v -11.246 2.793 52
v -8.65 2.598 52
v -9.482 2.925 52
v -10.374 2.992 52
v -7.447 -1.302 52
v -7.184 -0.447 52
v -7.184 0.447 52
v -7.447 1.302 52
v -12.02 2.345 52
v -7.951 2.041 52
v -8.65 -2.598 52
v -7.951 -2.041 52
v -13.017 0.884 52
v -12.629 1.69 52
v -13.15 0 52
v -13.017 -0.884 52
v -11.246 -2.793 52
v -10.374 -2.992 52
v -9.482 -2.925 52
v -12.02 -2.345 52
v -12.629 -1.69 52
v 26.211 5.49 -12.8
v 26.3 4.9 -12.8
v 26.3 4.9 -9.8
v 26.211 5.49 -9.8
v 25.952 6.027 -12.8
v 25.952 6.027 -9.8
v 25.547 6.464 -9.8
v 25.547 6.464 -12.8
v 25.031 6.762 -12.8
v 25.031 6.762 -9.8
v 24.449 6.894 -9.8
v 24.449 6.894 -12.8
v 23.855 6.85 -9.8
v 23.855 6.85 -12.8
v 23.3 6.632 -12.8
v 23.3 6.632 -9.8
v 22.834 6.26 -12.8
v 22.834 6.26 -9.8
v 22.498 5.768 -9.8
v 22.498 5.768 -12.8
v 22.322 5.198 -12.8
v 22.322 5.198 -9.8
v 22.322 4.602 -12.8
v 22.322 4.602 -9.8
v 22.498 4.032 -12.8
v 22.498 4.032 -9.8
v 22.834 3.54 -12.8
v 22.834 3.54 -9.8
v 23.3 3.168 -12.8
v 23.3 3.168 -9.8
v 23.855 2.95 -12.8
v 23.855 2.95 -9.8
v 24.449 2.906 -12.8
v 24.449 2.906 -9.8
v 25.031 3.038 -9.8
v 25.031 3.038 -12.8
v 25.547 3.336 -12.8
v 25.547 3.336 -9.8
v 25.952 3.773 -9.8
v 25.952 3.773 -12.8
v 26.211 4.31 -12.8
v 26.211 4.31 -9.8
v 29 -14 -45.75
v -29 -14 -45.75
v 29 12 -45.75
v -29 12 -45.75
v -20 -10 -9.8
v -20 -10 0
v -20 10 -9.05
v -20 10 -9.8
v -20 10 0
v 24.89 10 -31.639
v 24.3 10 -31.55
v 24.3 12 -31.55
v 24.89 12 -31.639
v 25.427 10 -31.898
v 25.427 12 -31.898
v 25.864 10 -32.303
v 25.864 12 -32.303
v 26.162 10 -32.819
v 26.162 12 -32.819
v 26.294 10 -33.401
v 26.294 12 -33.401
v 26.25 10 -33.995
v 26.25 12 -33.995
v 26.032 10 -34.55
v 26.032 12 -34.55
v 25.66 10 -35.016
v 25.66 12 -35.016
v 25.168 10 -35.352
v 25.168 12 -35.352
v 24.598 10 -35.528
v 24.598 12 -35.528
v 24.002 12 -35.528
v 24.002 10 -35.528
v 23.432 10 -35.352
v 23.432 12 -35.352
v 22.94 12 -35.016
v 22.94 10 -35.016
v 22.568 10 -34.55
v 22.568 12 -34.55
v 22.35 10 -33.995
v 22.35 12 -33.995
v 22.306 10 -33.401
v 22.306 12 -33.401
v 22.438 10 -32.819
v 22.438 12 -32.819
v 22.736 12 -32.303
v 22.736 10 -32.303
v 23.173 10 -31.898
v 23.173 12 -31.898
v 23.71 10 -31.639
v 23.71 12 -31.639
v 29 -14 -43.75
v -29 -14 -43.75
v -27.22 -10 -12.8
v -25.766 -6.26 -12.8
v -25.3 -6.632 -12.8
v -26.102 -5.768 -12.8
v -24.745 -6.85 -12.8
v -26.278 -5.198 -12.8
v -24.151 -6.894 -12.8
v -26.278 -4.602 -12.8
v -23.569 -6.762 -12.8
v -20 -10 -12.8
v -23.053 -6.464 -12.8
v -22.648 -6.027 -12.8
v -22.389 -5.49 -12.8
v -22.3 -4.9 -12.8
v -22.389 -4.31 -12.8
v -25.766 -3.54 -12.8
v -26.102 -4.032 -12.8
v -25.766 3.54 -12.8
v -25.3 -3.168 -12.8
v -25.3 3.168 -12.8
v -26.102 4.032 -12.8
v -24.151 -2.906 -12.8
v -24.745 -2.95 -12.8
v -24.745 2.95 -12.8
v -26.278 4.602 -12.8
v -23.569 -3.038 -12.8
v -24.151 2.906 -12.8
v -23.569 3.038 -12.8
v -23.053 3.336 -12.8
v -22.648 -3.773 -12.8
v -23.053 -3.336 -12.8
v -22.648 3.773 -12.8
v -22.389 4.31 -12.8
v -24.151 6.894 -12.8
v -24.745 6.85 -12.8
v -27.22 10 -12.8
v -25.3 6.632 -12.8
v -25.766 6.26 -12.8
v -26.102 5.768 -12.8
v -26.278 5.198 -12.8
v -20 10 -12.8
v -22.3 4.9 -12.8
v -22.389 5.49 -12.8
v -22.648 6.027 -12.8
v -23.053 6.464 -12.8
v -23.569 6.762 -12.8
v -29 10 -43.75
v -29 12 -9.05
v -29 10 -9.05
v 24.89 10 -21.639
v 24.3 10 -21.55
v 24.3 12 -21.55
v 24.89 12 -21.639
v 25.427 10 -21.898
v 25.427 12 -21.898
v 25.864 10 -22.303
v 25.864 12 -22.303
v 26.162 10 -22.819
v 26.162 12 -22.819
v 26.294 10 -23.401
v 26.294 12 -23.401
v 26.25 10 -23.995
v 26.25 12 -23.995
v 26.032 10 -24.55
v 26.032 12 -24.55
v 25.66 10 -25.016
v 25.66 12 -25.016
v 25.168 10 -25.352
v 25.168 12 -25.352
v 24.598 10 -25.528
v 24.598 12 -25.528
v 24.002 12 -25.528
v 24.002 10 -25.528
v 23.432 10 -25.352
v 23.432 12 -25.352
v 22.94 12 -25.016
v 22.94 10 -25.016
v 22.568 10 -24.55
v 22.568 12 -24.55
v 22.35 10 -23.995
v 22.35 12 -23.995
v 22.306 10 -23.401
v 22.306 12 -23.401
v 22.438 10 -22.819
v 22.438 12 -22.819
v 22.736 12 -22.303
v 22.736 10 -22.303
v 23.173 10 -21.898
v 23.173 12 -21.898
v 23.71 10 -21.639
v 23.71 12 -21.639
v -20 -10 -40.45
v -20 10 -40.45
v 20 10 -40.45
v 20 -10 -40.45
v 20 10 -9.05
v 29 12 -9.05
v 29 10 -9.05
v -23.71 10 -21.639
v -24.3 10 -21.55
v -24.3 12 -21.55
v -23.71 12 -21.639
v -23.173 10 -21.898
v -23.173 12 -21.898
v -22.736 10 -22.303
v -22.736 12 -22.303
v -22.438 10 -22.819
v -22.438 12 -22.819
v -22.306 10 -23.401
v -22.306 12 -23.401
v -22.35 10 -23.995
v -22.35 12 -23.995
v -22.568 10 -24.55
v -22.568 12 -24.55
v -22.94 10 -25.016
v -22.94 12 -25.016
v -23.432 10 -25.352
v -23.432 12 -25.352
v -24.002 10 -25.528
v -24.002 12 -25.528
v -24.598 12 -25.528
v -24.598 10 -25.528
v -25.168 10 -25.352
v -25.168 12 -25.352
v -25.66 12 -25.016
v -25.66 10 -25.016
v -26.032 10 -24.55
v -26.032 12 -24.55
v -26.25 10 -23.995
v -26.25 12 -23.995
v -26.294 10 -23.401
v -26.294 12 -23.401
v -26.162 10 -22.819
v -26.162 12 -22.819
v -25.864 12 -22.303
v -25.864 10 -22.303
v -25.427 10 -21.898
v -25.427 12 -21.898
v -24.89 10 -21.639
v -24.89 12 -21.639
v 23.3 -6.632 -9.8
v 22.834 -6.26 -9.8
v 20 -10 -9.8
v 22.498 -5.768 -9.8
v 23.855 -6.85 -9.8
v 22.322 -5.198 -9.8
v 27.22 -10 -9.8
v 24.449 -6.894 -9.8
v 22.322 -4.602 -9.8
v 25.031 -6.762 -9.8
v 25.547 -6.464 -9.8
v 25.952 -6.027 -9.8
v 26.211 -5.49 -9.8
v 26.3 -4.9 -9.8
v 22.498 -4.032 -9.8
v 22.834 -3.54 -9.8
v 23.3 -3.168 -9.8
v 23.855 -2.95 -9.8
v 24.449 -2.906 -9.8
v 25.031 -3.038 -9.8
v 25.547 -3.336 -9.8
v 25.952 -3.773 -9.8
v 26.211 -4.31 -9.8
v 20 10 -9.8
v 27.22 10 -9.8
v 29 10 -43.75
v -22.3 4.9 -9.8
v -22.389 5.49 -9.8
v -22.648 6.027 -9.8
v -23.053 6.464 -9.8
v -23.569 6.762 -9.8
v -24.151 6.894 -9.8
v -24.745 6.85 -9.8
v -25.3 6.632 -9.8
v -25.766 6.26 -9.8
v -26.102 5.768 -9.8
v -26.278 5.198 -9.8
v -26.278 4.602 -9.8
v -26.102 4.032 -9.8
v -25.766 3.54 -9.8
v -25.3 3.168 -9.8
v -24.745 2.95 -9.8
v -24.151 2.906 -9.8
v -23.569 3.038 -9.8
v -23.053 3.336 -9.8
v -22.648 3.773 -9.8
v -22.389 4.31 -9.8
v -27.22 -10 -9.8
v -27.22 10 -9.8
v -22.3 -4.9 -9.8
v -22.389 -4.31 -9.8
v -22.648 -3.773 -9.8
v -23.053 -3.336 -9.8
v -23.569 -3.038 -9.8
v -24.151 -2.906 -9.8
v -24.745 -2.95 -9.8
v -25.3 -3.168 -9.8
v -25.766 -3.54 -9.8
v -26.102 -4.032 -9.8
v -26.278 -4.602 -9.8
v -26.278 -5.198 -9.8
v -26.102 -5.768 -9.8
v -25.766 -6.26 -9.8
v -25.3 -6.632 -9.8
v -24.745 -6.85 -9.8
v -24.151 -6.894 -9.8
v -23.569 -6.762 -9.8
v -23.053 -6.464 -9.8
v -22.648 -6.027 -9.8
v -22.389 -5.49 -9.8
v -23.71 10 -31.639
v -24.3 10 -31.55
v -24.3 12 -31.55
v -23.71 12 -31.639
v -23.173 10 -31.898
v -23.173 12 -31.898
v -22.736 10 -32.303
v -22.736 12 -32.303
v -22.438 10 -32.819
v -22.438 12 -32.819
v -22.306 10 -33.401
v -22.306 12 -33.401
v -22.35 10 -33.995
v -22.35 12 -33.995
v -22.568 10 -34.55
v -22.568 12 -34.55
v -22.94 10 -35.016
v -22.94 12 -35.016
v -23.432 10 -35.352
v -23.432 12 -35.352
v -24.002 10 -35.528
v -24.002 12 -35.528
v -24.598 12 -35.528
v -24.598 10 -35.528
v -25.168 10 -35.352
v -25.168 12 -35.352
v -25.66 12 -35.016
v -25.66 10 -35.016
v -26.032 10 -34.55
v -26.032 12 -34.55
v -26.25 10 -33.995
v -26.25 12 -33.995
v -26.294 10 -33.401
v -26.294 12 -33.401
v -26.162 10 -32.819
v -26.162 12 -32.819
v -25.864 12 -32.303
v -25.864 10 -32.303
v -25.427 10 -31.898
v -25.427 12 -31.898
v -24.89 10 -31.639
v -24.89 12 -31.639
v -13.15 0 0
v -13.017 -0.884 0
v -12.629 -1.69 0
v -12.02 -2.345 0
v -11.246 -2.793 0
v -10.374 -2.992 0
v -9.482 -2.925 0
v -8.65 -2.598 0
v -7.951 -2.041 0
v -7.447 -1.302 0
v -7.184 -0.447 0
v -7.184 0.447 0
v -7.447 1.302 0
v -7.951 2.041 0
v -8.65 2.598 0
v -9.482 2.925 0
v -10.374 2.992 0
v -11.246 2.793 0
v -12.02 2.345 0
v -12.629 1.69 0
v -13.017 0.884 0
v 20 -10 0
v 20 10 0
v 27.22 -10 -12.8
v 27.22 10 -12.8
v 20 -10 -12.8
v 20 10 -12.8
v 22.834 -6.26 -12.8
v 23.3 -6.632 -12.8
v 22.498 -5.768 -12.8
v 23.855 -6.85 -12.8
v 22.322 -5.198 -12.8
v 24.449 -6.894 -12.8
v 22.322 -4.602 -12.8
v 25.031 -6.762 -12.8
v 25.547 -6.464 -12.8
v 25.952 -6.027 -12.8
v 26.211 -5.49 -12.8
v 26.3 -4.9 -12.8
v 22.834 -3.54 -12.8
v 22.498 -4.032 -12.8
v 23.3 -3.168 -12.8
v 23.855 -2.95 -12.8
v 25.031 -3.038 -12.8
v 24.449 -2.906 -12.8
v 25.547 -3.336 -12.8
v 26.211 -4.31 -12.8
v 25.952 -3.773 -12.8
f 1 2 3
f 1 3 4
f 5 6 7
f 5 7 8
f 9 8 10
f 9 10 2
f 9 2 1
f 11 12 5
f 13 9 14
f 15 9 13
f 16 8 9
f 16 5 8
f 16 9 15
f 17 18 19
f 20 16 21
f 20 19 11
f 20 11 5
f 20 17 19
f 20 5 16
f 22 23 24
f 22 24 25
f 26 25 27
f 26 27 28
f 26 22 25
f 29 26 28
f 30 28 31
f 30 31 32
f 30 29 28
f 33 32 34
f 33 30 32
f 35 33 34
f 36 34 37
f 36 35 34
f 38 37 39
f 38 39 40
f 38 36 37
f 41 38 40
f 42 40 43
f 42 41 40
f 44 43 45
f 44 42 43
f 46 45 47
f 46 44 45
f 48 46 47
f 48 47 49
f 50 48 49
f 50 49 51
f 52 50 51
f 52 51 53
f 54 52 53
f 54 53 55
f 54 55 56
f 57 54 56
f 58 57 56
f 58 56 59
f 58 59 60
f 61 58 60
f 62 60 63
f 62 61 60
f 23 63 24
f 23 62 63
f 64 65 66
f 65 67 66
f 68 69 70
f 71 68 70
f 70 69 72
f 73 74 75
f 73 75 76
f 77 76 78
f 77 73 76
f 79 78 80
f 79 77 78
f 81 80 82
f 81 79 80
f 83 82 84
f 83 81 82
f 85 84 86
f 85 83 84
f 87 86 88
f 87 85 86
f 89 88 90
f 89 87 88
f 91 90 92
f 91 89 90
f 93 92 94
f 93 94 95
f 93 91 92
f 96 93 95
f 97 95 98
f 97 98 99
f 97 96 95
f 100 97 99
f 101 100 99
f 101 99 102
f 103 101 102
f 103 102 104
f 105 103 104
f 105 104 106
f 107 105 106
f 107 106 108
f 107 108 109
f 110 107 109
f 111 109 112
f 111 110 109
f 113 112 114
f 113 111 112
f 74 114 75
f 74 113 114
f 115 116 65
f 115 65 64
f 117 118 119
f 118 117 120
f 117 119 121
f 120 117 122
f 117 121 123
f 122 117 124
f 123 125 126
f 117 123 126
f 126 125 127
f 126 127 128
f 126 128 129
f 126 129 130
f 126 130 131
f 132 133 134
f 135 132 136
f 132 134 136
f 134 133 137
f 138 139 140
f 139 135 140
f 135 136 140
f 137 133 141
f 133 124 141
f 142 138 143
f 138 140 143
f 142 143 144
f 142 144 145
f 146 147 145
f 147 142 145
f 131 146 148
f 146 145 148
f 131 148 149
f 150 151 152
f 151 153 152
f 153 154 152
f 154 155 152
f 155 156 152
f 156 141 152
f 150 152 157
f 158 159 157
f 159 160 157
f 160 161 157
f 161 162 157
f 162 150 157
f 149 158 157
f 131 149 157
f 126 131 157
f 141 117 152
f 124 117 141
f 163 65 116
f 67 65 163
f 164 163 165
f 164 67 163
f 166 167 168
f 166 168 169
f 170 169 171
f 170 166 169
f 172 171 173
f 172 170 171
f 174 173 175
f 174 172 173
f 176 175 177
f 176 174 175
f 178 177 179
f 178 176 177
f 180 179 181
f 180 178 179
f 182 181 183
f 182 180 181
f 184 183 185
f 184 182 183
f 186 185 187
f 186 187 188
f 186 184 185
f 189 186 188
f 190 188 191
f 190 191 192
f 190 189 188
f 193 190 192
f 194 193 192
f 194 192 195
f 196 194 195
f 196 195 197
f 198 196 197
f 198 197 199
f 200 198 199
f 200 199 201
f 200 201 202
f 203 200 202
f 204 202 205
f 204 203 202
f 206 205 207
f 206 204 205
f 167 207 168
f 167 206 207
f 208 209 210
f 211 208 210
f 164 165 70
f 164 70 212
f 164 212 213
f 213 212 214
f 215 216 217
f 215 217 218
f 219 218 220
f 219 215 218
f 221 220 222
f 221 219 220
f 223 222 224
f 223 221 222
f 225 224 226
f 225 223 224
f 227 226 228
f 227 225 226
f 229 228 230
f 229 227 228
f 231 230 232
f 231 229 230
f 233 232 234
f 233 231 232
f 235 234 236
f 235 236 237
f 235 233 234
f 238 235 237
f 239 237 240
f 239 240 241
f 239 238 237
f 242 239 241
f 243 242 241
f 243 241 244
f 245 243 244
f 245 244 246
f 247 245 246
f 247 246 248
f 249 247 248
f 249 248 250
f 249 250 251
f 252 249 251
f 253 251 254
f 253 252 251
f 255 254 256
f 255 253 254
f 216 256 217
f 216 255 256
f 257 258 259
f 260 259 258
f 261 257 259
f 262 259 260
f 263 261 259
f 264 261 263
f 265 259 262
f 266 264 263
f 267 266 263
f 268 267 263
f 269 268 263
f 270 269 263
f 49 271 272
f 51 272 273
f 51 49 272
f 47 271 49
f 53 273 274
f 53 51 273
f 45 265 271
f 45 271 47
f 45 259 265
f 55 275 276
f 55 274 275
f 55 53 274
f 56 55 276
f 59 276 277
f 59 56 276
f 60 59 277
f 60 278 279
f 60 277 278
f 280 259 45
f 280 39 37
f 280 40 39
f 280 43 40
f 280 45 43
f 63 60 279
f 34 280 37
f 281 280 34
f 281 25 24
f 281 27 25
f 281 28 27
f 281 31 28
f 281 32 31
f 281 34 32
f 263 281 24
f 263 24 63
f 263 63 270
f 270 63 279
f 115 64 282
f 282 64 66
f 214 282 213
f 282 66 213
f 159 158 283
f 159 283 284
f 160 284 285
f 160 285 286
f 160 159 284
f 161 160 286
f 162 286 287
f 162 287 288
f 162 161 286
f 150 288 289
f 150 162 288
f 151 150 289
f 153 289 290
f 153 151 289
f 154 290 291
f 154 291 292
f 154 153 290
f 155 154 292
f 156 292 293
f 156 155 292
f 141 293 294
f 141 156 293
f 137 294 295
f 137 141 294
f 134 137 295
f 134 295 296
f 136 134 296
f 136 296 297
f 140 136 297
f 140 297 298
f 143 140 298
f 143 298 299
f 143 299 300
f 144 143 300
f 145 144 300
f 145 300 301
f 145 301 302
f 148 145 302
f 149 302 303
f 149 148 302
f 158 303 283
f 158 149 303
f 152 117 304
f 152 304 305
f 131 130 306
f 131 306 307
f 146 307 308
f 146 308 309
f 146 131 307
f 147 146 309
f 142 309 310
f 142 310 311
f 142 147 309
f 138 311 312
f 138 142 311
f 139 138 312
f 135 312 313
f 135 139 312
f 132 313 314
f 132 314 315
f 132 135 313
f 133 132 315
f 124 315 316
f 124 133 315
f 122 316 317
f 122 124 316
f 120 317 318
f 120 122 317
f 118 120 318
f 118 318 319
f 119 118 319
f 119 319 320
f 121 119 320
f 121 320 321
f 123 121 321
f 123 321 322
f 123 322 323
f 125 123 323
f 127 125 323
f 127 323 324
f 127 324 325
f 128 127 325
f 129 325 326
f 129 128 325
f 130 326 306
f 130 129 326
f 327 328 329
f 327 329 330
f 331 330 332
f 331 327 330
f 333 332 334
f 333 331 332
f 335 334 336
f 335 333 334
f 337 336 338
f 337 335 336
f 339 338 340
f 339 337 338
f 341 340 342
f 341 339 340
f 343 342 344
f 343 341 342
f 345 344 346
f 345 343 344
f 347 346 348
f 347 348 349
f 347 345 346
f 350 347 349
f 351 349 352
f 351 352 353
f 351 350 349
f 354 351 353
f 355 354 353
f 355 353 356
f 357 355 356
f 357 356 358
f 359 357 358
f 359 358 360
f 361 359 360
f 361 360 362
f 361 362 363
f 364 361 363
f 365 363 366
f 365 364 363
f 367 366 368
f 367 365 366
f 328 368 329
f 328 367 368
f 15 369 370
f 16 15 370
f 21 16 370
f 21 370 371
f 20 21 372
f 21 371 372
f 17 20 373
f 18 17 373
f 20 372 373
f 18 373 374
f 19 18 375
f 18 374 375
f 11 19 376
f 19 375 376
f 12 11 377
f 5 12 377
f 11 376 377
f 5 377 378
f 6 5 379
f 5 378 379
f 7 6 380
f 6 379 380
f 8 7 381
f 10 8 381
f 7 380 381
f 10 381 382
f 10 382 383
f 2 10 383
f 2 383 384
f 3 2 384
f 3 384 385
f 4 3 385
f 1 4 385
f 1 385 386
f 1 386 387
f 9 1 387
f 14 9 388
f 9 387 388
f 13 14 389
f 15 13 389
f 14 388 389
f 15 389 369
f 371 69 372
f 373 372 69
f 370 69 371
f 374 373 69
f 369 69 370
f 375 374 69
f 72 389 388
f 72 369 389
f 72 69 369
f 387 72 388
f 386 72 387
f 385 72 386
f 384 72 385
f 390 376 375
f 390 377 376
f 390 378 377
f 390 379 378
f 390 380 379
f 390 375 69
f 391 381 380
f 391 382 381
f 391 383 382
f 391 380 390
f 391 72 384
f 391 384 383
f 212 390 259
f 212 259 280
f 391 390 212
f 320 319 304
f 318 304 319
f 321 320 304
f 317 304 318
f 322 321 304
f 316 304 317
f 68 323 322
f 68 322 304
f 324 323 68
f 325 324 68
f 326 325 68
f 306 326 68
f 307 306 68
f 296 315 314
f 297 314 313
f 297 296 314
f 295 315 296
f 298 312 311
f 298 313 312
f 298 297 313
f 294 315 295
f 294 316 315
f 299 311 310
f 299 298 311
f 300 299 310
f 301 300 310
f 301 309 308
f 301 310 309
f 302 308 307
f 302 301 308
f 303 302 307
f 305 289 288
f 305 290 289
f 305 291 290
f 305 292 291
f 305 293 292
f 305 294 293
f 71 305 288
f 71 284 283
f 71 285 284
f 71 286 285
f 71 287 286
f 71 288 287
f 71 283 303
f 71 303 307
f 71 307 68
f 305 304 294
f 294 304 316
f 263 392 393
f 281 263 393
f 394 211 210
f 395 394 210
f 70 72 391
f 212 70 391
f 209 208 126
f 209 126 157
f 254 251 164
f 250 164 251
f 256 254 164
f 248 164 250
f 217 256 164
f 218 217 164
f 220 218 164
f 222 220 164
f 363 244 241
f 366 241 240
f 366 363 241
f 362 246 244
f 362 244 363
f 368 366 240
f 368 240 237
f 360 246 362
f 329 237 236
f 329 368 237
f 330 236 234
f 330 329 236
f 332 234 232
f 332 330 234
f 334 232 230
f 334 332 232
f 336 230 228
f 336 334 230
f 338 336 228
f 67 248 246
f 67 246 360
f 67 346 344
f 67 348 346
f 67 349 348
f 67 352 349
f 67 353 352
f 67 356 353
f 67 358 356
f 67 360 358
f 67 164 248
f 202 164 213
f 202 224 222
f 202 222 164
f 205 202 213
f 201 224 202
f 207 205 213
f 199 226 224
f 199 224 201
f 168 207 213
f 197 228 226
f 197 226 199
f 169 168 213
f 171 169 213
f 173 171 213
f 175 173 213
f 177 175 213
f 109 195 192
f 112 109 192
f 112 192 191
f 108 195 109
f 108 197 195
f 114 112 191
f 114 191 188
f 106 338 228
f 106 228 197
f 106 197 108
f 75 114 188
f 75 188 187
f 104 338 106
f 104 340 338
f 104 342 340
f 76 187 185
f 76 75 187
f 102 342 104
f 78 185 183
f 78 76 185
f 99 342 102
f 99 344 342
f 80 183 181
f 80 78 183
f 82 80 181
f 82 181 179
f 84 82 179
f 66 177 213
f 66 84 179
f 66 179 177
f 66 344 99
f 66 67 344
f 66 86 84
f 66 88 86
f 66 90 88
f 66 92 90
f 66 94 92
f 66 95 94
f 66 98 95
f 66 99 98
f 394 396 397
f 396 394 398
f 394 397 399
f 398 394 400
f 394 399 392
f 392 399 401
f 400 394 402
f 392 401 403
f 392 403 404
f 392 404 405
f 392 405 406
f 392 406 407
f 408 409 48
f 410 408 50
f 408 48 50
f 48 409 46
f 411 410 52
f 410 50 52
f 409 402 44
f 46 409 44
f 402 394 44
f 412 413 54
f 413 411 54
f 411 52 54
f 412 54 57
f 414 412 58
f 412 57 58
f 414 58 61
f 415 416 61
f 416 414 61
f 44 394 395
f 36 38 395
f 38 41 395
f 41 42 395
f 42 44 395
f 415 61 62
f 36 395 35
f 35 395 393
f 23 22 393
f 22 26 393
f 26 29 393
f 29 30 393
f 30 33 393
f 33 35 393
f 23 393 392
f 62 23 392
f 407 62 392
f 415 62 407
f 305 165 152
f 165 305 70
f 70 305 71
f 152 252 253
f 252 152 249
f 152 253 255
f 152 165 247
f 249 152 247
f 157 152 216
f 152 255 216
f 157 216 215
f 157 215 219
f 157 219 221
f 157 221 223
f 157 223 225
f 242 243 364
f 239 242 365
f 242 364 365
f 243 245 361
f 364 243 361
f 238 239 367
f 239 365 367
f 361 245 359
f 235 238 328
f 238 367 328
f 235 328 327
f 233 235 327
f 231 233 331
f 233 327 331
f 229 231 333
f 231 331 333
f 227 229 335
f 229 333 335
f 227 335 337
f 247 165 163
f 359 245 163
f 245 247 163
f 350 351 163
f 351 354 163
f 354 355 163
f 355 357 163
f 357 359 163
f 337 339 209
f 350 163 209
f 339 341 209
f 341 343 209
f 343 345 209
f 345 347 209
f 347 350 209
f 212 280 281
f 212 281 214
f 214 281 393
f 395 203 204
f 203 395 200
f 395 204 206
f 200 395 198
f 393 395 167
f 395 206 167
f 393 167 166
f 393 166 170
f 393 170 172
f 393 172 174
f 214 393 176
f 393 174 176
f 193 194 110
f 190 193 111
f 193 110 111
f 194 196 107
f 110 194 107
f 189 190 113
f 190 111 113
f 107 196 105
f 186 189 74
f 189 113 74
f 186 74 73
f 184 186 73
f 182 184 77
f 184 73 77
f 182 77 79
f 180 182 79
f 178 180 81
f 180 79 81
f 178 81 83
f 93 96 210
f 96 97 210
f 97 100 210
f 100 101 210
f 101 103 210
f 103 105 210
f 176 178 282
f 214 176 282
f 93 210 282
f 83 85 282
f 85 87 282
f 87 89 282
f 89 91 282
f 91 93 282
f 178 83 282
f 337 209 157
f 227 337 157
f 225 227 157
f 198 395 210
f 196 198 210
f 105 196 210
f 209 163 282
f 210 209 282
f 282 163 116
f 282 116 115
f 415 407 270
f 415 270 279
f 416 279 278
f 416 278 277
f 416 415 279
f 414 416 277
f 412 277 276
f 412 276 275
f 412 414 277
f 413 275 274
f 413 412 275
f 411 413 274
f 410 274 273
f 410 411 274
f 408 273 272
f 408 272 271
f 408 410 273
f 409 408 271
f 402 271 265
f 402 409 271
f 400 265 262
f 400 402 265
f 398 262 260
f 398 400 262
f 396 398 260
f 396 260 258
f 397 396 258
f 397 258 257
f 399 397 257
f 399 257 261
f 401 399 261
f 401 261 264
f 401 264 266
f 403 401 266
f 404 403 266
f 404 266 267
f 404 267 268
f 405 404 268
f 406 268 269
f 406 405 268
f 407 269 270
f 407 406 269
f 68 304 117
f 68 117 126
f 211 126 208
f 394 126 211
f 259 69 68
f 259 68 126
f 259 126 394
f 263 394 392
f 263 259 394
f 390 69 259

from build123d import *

# Parameters (mm, degrees)
SKETCH2_W           = 40
SKETCH2_H           = 20
BOSS_EXTRUDE1_DEPTH = 40.45
BOSS_EXTRUDE2_START = -12.8
SKETCH2_3_W         = 7.22
SKETCH2_3_H         = 20
SKETCH2_3_R         = 2
BOSS_EXTRUDE2_DEPTH = 3
SKETCH2_4_R         = 3
BOSS_EXTRUDE3_DEPTH = 52
SKETCH3_W           = 58
SKETCH3_H           = 36.7
SKETCH3_R           = 2
BOSS_EXTRUDE4_DEPTH = 2
SKETCH4_W           = 58
SKETCH4_H           = 2
BOSS_EXTRUDE5_DEPTH = 24


with BuildPart() as part:
    # Sketch2 → Boss-Extrude1 (new body)
    with BuildSketch(Plane.XY):
        Rectangle(SKETCH2_W, SKETCH2_H)
    extrude(amount=-BOSS_EXTRUDE1_DEPTH)

    # Sketch2<3> → Boss-Extrude2 (add)
    # profile 1 of 2: a face of its own
    with BuildSketch(Plane.XY.offset(BOSS_EXTRUDE2_START)):
        with Locations((-23.61, 0)):
            Rectangle(SKETCH2_3_W, SKETCH2_3_H)
        with Locations((-24.3, -4.9)):
            Circle(SKETCH2_3_R, mode=Mode.SUBTRACT)
        with Locations((-24.3, 4.9)):
            Circle(SKETCH2_3_R, mode=Mode.SUBTRACT)
    # profile 2 of 2: a face of its own
    with BuildSketch(Plane.XY.offset(BOSS_EXTRUDE2_START)):
        with Locations((23.61, 0)):
            Rectangle(SKETCH2_3_W, SKETCH2_3_H)
        with Locations((24.3, -4.9)):
            Circle(SKETCH2_3_R, mode=Mode.SUBTRACT)
        with Locations((24.3, 4.9)):
            Circle(SKETCH2_3_R, mode=Mode.SUBTRACT)
    extrude(amount=BOSS_EXTRUDE2_DEPTH)

    # Sketch2<4> → Boss-Extrude3 (add)
    with BuildSketch(Plane.XY):
        with Locations((-10.15, 0)):
            Circle(SKETCH2_4_R)
    extrude(amount=BOSS_EXTRUDE3_DEPTH)

    # Sketch3 → Boss-Extrude4 (add)
    with BuildSketch(Plane(origin=(0, 10, 0), x_dir=(1, 0, 0), z_dir=(0, 1, 0))):
        with Locations((0, 27.4)):
            Rectangle(SKETCH3_W, SKETCH3_H)
        with Locations((-24.3, 33.55)):
            Circle(SKETCH3_R, mode=Mode.SUBTRACT)
        with Locations((-24.3, 23.55)):
            Circle(SKETCH3_R, mode=Mode.SUBTRACT)
        with Locations((24.3, 33.55)):
            Circle(SKETCH3_R, mode=Mode.SUBTRACT)
        with Locations((24.3, 23.55)):
            Circle(SKETCH3_R, mode=Mode.SUBTRACT)
    extrude(amount=BOSS_EXTRUDE4_DEPTH)

    # Sketch4 → Boss-Extrude5 (add)
    with BuildSketch(Plane.XZ.offset(-10)):
        with Locations((0, -44.75)):
            Rectangle(SKETCH4_W, SKETCH4_H)
    extrude(amount=BOSS_EXTRUDE5_DEPTH)


solid = part.part
